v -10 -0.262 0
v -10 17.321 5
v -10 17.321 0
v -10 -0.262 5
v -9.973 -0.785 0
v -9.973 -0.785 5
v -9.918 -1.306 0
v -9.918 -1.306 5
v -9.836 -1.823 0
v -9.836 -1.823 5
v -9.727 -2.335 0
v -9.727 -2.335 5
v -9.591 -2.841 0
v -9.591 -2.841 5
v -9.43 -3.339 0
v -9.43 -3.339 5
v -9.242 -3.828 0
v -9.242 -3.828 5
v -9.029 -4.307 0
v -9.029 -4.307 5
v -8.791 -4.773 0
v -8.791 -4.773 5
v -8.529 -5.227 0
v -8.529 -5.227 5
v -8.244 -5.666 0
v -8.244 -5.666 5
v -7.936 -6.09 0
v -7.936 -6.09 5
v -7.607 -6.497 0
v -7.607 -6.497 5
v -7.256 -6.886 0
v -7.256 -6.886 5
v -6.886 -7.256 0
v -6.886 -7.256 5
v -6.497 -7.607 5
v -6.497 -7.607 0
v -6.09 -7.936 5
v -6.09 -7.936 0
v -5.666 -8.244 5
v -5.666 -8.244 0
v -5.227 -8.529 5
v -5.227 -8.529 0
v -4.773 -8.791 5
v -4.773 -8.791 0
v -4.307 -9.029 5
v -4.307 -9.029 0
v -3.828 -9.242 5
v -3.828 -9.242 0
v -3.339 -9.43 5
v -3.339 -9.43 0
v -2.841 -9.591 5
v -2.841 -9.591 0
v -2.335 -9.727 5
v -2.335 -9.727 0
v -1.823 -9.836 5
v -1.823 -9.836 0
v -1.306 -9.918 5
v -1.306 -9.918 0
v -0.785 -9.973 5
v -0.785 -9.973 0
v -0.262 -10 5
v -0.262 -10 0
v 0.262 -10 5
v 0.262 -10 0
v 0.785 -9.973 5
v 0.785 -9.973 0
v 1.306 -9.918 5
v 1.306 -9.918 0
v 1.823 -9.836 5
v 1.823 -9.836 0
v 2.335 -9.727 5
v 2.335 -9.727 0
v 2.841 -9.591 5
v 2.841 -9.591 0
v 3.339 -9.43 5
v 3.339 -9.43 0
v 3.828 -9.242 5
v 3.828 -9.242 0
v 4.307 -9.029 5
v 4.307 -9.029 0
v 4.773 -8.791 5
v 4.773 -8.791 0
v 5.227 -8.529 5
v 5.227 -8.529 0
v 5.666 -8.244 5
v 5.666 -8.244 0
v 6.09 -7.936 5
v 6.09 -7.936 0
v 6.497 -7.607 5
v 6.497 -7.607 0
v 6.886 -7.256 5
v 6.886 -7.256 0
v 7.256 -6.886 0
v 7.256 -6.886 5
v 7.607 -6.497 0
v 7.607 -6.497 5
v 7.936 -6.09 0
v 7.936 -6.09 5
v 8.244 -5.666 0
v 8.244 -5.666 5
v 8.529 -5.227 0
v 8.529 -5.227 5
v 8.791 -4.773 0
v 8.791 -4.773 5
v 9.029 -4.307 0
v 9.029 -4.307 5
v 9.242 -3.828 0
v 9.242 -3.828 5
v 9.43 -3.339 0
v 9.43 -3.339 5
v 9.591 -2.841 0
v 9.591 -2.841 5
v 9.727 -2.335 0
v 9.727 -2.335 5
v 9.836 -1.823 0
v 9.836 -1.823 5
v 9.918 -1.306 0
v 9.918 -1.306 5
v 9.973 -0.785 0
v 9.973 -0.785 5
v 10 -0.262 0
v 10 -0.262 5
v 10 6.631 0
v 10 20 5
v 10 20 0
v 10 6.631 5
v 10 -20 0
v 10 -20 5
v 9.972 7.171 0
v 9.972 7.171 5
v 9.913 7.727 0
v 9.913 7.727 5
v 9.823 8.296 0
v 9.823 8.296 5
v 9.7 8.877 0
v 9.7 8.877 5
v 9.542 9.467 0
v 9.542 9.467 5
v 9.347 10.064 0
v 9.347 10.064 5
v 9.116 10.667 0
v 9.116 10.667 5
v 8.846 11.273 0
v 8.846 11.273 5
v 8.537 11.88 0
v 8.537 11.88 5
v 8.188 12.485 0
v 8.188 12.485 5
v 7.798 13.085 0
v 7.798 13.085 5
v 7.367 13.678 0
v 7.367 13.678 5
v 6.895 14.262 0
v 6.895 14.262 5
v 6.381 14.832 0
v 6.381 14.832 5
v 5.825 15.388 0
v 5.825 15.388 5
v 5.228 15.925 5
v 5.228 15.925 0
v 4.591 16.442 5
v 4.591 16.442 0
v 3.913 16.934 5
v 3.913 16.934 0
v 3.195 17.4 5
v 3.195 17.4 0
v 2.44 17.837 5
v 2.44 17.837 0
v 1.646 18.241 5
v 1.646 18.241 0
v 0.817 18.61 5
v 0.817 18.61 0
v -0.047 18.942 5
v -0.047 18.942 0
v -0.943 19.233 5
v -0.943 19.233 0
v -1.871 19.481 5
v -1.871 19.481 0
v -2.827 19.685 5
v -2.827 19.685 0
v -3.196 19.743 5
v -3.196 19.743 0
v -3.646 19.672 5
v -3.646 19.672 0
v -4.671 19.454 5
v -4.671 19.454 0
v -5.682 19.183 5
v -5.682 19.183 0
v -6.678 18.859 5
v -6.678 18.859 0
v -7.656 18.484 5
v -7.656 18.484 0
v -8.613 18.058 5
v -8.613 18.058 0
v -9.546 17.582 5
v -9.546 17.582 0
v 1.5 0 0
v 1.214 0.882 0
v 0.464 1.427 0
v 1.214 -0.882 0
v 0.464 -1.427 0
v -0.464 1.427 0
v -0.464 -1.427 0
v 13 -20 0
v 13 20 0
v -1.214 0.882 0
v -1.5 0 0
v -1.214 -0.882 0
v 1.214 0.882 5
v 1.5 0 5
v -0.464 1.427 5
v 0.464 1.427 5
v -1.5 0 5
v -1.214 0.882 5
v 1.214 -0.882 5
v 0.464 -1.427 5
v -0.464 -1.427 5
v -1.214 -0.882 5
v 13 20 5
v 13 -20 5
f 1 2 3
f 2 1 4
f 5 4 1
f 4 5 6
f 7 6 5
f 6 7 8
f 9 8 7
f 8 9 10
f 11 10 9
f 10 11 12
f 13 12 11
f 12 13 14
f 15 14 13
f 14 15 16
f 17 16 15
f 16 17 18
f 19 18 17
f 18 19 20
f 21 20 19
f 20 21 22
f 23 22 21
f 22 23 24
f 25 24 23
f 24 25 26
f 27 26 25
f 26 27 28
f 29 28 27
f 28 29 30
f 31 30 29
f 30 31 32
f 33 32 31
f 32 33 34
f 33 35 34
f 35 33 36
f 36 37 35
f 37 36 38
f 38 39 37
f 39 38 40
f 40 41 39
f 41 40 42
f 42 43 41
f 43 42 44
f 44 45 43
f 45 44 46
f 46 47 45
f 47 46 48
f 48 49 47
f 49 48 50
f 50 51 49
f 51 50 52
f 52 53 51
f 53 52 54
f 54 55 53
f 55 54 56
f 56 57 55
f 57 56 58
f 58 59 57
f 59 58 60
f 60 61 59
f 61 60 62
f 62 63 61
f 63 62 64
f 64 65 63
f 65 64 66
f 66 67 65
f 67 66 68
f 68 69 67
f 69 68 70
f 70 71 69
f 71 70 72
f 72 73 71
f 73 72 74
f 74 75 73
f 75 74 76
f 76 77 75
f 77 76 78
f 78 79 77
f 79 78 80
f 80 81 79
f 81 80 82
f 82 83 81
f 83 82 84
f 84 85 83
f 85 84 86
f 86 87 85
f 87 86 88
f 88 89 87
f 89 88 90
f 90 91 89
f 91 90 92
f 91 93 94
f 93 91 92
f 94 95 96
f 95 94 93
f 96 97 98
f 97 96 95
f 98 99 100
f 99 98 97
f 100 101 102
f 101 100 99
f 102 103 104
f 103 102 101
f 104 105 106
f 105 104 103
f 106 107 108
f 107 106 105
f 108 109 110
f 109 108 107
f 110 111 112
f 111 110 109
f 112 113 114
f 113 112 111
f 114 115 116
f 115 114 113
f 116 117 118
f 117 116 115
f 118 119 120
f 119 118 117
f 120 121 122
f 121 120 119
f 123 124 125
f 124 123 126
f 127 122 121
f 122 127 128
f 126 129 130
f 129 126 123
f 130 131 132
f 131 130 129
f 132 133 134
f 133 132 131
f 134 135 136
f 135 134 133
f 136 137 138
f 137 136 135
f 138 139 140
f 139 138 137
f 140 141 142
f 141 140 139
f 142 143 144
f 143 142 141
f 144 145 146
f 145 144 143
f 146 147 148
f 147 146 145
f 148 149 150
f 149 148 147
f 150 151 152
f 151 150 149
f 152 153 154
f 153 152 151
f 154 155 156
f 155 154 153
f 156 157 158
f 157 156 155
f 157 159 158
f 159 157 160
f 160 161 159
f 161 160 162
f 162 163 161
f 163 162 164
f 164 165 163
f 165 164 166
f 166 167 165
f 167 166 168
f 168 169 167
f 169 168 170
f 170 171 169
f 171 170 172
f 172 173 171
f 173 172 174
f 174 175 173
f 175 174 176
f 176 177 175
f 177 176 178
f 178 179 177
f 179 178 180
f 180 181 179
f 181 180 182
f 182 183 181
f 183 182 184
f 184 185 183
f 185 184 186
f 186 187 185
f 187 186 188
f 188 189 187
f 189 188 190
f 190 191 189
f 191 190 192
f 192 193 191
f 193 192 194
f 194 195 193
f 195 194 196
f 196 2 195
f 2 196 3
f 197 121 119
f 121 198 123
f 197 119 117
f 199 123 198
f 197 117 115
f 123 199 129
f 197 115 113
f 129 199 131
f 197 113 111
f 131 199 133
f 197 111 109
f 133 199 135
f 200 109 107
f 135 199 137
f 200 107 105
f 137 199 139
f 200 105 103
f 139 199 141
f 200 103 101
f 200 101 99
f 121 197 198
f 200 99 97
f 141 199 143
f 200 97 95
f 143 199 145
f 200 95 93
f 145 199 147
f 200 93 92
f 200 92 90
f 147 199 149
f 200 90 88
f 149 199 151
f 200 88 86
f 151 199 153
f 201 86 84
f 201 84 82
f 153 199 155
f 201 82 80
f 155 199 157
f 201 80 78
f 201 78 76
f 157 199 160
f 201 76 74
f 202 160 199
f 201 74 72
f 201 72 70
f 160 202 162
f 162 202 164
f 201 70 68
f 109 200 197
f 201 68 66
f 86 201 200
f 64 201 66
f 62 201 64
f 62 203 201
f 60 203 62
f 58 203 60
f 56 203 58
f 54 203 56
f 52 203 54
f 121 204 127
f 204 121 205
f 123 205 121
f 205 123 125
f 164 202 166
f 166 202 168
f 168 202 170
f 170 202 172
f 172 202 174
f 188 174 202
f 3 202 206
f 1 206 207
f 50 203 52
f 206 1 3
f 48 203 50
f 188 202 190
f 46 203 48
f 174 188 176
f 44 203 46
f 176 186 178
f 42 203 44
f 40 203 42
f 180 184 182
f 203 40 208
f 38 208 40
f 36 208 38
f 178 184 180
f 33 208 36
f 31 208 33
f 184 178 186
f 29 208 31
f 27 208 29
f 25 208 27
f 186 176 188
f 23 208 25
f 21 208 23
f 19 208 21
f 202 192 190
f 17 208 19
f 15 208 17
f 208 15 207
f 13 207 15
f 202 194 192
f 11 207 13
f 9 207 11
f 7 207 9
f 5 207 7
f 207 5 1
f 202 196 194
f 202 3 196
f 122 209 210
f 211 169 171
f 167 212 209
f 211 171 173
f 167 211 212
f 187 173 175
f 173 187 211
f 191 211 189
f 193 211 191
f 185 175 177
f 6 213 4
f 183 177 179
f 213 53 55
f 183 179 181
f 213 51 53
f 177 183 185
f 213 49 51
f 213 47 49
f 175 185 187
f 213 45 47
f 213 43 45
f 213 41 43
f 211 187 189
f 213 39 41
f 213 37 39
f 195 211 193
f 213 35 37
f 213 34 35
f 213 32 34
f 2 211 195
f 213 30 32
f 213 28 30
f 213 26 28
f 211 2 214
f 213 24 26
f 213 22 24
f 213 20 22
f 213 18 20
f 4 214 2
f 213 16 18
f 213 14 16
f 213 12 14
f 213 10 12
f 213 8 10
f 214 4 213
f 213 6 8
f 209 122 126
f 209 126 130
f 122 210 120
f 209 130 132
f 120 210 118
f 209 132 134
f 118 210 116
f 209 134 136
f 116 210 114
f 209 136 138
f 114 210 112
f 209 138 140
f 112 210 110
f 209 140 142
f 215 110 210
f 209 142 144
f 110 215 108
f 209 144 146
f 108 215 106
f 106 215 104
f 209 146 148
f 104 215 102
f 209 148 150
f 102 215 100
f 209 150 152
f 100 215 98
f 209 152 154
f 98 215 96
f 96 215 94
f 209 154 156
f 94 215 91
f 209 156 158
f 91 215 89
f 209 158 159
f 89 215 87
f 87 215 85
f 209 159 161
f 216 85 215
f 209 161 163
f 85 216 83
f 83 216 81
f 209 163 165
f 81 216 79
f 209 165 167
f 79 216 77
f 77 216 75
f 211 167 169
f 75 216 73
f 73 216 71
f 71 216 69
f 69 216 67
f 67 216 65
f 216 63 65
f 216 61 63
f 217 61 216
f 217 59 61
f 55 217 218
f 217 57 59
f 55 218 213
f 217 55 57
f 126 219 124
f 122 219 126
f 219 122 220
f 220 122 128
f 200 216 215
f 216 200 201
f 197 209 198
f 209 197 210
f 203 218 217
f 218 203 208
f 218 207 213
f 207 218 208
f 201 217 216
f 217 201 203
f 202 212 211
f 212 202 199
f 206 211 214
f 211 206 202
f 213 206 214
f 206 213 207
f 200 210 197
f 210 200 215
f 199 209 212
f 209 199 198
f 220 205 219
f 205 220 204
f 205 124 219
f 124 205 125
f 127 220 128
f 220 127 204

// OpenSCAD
start_height  =  10;
end_height    =  20;
start_angle   = 180;
end_angle     = 270;
thickness     =   5;
axis_diameter =   3;

top_suface          =  1; // [0:Bearing, 1:Flat]
bearing_diameter    = 11;
bearing_displacement = 0;

demo_mode  = 1; // [0:Disable, 1:Enable]
demo_angle = 180; // [0:360]

// Uncomment the following line to animate in openscad
// demo_angle = ($t < 0.5 ? 2*$t : 2-2*$t) * (end_angle-start_angle) + start_angle;

module z_lift_translate(r0, r1, a0, a1, angle) {
	assign (
		r = (angle<=a0) ? r0 : (angle>=a1) ? r1 : r0+(r1-r0)*(angle-a0)/(a1-a0)
	) translate([r, 0, 0]) child();
}

module z_lift_core(r0, r1, a0, a1, h, rax) {
	difference() {
		cylinder(r=r1*2, h=h, $fn=360);
		for (i=[0:3:360]) assign (
			r = (i<=a0) ? r0 : (i>=a1) ? r1 : r0+(r1-r0)*(i-a0)/(a1-a0)
		) {
			rotate([0, 0, i]) translate([r, 0, -1]) child();
		}
		cylinder(r=rax, h=3*h, center=true, $fn=10);
	}
}

module z_lift_flattop(r0, r1, a0, a1, h, rax) {
	z_lift_core(r0, r1, a0, a1, h, rax) 
		translate([0,-2*r1,0]) cube([2*r1, 4*r1, h+2]);
}

module z_lift_bearing(r0, r1, a0, a1, h, rax, br, bdisp=0) {
	z_lift_core(r0, r1, a0, a1, h, rax) union() {
		translate([br, bdisp, 0]) cylinder(r=br, h=h+2);
		translate([br, bdisp-br, 0]) cube(size=[5*r1, 2*br, h+2]);
	}
}

if (top_suface) {
	if (!demo_mode) {
		z_lift_flattop(
			r0 = start_height,
			r1 = end_height,
			a0 = start_angle,
			a1 = end_angle,
			h  = thickness,
			rax = axis_diameter/2
		);
	} else {
		rotate([0,0,-demo_angle]) z_lift_flattop(
			r0 = start_height,
			r1 = end_height,
			a0 = start_angle,
			a1 = end_angle,
			h  = thickness,
			rax = axis_diameter/2
		);
		z_lift_translate(
			r0 = start_height,
			r1 = end_height,
			a0 = start_angle,
			a1 = end_angle,
			angle = demo_angle
		) color([0.5,0.5,0.5]) translate([0, -end_height, 0]) cube([axis_diameter, 2*end_height, thickness]);
	}
} else {
	if (!demo_mode) {
		z_lift_bearing(
			r0 = start_height,
			r1 = end_height,
			a0 = start_angle,
			a1 = end_angle,
			h  = thickness,
			rax = axis_diameter/2,
			br = bearing_diameter/2,
			bdisp = bearing_displacement
		);
	} else {
		rotate([0,0,-demo_angle]) z_lift_bearing(
			r0 = start_height,
			r1 = end_height,
			a0 = start_angle,
			a1 = end_angle,
			h  = thickness,
			rax = axis_diameter/2,
			br = bearing_diameter/2,
			bdisp = bearing_displacement
		);

		z_lift_translate(
			r0 = start_height,
			r1 = end_height,
			a0 = start_angle,
			a1 = end_angle,
			angle = demo_angle
		) color([0.5,0.5,0.5]) translate([bearing_diameter/2, bearing_displacement, 0])
			cylinder(r=bearing_diameter/2, h=thickness);
	}
}
